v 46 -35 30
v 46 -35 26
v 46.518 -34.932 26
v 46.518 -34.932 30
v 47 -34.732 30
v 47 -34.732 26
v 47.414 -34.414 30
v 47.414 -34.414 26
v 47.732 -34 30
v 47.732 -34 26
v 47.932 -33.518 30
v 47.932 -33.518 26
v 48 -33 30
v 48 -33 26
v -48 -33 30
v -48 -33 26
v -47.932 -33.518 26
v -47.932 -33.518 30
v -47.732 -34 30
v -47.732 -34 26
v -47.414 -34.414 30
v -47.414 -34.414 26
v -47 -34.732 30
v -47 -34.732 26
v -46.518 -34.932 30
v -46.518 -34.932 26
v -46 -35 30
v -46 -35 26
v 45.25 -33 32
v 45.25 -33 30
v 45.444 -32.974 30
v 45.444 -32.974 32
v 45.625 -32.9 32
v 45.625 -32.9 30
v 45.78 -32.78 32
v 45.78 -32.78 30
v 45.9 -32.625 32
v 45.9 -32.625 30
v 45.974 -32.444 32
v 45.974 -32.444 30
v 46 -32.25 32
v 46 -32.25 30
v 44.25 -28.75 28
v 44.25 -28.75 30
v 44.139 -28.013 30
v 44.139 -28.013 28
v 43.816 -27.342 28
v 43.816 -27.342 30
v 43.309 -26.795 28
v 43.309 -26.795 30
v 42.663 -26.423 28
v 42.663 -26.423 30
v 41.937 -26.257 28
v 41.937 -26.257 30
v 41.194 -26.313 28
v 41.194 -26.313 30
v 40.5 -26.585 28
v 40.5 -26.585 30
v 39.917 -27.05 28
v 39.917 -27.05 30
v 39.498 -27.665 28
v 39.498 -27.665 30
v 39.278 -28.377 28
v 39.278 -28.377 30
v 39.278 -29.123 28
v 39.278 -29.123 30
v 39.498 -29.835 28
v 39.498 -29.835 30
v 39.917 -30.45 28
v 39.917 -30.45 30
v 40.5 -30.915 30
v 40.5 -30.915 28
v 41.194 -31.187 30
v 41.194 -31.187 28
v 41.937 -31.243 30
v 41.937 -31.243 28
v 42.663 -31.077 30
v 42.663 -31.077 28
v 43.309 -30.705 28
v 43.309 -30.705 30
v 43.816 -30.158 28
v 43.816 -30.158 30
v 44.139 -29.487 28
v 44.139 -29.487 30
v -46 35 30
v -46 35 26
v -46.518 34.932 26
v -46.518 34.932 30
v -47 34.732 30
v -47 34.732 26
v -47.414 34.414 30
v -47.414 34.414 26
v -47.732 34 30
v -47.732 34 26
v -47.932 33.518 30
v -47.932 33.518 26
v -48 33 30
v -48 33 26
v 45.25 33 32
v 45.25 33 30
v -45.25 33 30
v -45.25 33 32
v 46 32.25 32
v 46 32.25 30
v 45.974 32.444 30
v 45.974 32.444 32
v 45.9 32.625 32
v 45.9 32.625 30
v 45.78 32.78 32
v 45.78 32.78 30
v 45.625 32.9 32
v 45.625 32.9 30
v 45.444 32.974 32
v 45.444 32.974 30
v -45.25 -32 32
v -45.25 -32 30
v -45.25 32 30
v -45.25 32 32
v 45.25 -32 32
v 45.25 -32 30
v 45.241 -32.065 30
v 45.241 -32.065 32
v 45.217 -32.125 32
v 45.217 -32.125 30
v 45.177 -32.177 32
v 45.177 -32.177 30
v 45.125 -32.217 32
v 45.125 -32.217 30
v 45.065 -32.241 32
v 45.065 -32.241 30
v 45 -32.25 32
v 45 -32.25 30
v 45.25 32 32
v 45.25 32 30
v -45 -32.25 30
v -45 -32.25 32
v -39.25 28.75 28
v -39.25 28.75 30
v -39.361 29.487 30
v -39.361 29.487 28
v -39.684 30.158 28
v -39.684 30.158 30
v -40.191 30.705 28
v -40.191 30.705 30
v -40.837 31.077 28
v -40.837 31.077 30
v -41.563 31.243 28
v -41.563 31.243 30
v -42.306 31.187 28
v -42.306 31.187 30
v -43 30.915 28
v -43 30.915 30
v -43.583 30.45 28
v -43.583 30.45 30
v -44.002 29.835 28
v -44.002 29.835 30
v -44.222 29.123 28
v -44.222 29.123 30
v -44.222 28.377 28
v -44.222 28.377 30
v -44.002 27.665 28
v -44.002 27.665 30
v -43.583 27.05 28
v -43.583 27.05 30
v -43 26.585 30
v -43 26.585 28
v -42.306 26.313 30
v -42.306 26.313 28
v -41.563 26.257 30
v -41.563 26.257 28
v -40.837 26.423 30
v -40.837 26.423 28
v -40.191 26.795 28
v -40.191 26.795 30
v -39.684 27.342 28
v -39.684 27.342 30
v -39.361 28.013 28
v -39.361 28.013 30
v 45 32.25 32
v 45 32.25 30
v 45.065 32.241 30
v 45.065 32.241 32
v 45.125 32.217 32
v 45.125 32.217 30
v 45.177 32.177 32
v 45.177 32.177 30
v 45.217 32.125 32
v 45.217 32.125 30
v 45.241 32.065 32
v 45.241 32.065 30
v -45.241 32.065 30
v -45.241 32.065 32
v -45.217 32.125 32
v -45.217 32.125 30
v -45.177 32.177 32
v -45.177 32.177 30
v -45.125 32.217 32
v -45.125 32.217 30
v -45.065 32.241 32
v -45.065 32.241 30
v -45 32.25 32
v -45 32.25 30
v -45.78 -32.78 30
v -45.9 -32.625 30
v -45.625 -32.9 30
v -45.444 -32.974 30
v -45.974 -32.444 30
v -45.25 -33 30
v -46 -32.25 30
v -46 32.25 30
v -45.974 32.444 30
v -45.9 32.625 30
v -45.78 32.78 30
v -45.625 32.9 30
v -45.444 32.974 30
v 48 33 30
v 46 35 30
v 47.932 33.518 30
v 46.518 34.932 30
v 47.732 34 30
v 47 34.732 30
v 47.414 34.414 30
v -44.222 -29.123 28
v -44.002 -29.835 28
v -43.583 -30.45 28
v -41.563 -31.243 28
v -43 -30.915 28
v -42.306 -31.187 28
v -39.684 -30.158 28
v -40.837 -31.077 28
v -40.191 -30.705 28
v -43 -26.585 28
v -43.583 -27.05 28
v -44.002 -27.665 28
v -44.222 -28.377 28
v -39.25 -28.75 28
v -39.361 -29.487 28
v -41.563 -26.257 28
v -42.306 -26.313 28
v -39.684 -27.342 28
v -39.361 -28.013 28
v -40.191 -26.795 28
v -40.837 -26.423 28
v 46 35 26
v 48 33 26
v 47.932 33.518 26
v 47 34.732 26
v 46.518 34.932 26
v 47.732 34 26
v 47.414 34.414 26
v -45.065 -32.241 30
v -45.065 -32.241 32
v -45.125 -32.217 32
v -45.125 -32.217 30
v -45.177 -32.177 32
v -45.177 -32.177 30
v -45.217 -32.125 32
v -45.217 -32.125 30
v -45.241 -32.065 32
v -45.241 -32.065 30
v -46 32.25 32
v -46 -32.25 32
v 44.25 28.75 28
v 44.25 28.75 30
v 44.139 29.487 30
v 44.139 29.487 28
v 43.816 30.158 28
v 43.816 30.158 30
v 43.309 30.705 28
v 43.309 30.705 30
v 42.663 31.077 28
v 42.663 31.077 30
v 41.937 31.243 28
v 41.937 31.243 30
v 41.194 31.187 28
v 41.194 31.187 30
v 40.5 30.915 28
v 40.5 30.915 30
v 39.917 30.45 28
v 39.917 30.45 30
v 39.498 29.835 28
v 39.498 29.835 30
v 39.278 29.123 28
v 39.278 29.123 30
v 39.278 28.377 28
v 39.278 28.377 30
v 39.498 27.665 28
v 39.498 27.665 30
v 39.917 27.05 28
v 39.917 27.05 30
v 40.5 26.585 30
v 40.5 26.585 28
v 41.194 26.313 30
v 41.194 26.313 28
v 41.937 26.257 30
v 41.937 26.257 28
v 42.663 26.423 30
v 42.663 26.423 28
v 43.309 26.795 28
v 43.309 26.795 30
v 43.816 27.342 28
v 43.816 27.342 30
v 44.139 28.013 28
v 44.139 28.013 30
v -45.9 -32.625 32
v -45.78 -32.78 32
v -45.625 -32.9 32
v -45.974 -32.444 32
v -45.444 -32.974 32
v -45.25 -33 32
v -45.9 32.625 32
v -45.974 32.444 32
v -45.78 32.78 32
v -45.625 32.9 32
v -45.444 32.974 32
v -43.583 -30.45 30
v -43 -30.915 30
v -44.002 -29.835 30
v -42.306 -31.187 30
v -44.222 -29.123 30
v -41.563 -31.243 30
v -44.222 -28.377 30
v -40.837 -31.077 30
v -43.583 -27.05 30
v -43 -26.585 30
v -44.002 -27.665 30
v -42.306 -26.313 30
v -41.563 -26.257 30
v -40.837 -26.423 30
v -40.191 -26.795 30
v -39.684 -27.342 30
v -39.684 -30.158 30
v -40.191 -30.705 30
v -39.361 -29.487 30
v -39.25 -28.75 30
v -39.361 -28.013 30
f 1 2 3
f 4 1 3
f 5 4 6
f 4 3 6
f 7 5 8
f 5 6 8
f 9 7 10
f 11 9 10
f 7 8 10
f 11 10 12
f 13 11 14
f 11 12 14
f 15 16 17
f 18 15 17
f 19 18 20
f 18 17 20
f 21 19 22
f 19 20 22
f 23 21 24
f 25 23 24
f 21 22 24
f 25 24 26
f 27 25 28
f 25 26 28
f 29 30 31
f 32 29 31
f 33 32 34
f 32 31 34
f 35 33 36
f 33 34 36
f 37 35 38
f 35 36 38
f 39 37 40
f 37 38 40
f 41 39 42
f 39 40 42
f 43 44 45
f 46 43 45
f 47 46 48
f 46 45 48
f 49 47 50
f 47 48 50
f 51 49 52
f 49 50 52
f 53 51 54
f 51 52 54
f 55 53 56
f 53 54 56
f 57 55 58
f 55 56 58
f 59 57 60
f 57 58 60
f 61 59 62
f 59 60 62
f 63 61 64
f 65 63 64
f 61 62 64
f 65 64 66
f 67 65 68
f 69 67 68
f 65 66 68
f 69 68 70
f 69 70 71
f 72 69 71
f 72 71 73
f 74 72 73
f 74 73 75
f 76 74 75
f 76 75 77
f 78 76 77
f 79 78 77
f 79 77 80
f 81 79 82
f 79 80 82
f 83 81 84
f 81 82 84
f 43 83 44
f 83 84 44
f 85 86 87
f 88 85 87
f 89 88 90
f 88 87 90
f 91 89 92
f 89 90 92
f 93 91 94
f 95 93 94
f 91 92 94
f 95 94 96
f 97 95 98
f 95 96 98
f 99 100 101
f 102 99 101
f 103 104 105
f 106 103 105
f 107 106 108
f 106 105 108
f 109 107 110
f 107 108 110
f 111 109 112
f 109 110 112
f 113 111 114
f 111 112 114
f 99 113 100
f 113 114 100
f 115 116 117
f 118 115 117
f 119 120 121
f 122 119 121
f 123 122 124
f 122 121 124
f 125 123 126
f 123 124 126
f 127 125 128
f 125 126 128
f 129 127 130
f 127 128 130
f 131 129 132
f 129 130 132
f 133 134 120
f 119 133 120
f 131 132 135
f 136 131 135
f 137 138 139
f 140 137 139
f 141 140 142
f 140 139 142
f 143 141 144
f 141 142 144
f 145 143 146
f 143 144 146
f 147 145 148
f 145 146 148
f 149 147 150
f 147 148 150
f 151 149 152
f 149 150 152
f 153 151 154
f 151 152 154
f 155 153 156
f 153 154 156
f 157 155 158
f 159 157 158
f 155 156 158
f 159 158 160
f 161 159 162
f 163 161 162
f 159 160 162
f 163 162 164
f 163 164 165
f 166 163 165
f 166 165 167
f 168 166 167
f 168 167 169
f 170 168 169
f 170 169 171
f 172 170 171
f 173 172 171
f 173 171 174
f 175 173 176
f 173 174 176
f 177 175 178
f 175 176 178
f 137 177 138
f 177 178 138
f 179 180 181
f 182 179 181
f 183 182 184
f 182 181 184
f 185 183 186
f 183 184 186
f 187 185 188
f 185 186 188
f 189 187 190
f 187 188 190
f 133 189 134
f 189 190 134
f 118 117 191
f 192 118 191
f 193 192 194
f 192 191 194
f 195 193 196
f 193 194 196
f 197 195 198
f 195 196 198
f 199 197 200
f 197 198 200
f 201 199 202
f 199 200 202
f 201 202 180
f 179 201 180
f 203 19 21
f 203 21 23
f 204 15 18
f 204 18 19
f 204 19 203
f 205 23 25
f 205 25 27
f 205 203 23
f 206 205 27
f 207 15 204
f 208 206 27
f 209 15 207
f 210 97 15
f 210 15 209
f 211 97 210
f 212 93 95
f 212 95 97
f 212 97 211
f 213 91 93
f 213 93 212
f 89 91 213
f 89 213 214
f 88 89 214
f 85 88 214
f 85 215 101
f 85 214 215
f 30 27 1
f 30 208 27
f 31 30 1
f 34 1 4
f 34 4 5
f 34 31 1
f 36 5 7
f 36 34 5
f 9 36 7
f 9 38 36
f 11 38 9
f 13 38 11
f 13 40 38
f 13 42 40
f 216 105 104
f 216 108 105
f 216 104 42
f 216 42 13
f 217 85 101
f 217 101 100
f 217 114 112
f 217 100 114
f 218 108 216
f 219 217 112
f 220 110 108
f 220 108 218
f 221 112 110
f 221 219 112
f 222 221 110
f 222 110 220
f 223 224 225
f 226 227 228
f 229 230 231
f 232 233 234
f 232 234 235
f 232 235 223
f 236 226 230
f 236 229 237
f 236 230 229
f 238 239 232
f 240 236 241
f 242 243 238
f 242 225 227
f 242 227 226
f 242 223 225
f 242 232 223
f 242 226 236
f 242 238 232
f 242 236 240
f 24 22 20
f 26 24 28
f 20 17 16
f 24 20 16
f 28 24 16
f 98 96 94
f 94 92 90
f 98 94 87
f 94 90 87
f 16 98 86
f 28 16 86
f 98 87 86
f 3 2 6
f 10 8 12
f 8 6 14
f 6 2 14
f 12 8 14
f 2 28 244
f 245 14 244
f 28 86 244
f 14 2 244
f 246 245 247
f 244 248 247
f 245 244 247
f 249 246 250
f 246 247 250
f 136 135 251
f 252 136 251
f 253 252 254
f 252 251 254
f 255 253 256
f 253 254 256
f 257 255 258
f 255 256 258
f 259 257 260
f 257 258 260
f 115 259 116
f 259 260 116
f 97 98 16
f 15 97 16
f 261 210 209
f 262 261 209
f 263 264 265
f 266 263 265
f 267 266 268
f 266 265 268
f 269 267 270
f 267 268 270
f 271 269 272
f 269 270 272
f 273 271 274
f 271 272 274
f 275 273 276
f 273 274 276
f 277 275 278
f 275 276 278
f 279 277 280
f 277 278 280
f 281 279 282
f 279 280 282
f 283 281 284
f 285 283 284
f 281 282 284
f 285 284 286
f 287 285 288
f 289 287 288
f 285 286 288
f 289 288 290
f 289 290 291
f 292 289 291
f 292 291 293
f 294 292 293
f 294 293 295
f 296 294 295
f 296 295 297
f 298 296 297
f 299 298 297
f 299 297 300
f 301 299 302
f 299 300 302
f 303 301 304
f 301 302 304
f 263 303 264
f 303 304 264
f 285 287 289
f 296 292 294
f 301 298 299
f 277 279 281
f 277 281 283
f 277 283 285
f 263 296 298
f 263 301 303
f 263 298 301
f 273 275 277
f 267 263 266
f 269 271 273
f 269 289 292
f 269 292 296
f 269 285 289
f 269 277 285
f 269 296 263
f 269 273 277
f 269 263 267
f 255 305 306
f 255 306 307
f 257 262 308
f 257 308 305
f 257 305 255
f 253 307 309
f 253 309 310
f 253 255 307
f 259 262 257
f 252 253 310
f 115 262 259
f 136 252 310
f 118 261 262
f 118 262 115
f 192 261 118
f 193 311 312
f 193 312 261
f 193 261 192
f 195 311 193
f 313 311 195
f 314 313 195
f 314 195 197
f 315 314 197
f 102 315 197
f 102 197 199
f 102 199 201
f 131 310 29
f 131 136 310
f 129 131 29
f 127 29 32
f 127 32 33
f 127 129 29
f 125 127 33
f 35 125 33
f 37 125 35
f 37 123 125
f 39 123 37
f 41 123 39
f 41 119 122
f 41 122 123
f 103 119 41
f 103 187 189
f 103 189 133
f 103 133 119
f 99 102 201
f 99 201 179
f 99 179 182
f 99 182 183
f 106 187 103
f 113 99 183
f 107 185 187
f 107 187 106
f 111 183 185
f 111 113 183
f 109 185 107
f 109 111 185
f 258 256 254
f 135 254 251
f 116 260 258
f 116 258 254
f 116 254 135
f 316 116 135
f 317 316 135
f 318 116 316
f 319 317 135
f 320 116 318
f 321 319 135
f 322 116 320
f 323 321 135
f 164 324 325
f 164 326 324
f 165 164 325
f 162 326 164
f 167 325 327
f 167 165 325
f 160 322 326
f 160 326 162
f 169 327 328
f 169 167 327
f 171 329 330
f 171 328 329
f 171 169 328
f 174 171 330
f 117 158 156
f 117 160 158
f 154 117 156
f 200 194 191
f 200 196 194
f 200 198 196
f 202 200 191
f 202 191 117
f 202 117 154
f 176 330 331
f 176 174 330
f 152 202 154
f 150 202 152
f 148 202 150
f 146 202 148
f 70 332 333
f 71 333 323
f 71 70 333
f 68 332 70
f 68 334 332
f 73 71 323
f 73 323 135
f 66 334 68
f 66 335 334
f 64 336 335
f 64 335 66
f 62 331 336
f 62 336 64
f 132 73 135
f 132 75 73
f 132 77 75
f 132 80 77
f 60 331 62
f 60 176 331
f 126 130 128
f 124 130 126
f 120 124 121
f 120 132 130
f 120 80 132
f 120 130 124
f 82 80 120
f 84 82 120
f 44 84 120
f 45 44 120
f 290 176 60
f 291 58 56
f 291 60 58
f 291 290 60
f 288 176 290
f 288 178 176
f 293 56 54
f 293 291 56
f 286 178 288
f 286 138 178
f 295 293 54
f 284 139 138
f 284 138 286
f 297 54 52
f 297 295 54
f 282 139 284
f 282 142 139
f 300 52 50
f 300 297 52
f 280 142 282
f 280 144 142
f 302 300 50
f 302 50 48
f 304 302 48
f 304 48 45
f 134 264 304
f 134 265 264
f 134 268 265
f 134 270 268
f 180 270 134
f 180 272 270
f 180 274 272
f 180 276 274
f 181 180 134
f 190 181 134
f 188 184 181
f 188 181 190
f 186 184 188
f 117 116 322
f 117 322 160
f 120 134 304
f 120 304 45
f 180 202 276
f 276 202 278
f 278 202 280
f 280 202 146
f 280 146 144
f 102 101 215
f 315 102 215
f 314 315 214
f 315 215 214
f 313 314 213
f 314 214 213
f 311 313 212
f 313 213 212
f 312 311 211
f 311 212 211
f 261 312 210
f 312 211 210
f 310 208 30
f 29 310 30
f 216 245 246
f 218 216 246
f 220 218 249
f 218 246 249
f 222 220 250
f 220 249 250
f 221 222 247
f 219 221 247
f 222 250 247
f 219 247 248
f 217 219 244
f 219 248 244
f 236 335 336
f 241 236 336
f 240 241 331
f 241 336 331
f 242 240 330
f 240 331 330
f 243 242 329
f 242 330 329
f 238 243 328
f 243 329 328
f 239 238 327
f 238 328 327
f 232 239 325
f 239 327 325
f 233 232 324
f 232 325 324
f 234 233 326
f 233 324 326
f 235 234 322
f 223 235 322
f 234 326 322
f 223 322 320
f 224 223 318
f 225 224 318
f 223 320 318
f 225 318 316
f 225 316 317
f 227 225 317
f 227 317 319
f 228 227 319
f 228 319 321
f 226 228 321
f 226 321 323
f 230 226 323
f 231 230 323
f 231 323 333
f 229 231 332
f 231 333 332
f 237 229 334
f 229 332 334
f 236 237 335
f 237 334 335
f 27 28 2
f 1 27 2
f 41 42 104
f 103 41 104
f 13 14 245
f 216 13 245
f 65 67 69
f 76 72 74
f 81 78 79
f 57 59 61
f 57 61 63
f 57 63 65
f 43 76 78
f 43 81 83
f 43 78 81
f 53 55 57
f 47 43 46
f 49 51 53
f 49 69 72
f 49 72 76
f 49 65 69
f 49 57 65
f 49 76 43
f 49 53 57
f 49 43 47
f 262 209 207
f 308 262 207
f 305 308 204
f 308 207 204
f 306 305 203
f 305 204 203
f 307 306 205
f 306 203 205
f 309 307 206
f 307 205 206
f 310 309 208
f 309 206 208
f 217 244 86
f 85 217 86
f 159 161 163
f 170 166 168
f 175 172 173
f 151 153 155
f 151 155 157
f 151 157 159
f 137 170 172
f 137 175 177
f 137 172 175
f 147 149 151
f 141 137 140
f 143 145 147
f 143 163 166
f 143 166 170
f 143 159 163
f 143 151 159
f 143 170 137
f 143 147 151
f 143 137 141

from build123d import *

# Parameters (mm, degrees)
F1_DEPTH  = 26
F2_DEPTH  = 4
F3_W      = 90
F3_H      = 64
F4_DEPTH  = 2
F6_DEPTH  = 2
F7_R      = 2.5
F8_DEPTH  = 2
F9_R      = 2.5
F10_DEPTH = 2
F11_W     = 5
F11_H     = 50
F11_W_2   = 76
F11_H_2   = 5
F12_DEPTH = 22
F13_R     = 1
F14_DEPTH = 5
F15_R     = 11
F15_R_2   = 5
F16_DEPTH = 2
F17_DEPTH = 5
F19_W     = 20.16
F19_H     = 11.52
F19_R     = 3
F19_R_2   = 2
F20_DEPTH = 5
F19_W_2   = 66
F19_H_2   = 18
F19_R_3   = 1.8
F21_DEPTH = 3
F22_DEPTH = 3
F19_R_4   = 0.8
F23_DEPTH = 1.9
F24_DEPTH = 1.9
F25_DEPTH = 1.9


# Not quite as in the source:
# - a feature names something its author has since deleted; it is built from what else it names


with BuildPart() as f1:
    # F0 (on Top) → F1 (new body)
    with BuildSketch(Plane.XY):
        with BuildLine():
            Line((46, 35), (-46, 35))
            ThreePointArc((-46, 35), (-47.4142135624, 34.4142135624), (-48, 33))
            Line((-48, 33), (-48, -33))
            ThreePointArc((-48, -33), (-47.4142135624, -34.4142135624), (-46, -35))
            Line((-46, -35), (46, -35))
            ThreePointArc((46, -35), (47.4142135624, -34.4142135624), (48, -33))
            Line((48, -33), (48, 33))
            ThreePointArc((48, 33), (47.4142135624, 34.4142135624), (46, 35))
        make_face()
    extrude(amount=F1_DEPTH)


with BuildPart() as f2:
    # F2 (new): a face of the model
    f2_faces = [f1.part.faces().sort_by_distance(p)[0] for p in [
        (0, 0, 26),
    ]]
    extrude(f2_faces, amount=F2_DEPTH)

    # F5 (on face) → F6 (join)
    with BuildSketch(Plane.XY.offset(30)):
        with BuildLine():
            Line((45.25, 33), (-45.25, 33))
            ThreePointArc((-45.25, 33), (-45.7803300859, 32.7803300859), (-46, 32.25))
            Line((-46, 32.25), (-46, -32.25))
            ThreePointArc((-46, -32.25), (-45.7803300859, -32.7803300859), (-45.25, -33))
            Line((-45.25, -33), (45.25, -33))
            ThreePointArc((45.25, -33), (45.7803300859, -32.7803300859), (46, -32.25))
            Line((46, -32.25), (46, 32.25))
            ThreePointArc((46, 32.25), (45.7803300859, 32.7803300859), (45.25, 33))
        make_face()
        with BuildLine():
            ThreePointArc((-45.25, 32), (-45.1767766953, 32.1767766953), (-45, 32.25))
            Line((-45, 32.25), (45, 32.25))
            ThreePointArc((45, 32.25), (45.1767766953, 32.1767766953), (45.25, 32))
            Line((45.25, 32), (45.25, -32))
            ThreePointArc((45.25, -32), (45.1767766953, -32.1767766953), (45, -32.25))
            Line((45, -32.25), (-45, -32.25))
            ThreePointArc((-45, -32.25), (-45.1767766953, -32.1767766953), (-45.25, -32))
            Line((-45.25, -32), (-45.25, 32))
        make_face(mode=Mode.SUBTRACT)
    extrude(amount=F6_DEPTH)

    # F9 (on face) → F10 (cut)
    with BuildSketch(Plane.XY.offset(30)):
        with Locations((-41.75, -28.75)):
            Circle(F9_R)
        with Locations((-41.75, 28.75)):
            Circle(F9_R)
        with Locations((41.75, 28.75)):
            Circle(F9_R)
        with Locations((41.75, -28.75)):
            Circle(F9_R)
    extrude(amount=-F10_DEPTH, mode=Mode.SUBTRACT)


with BuildPart() as f1_1:
    add(f1.part)

    # F3 (on face) → F4 (cut)
    with BuildSketch(Plane.XY.offset(26)):
        with BuildLine():
            Line((45, 33), (-45, 33))
            ThreePointArc((-45, 33), (-45.7071067812, 32.7071067812), (-46, 32))
            Line((-46, 32), (-46, -32))
            ThreePointArc((-46, -32), (-45.7071067812, -32.7071067812), (-45, -33))
            Line((-45, -33), (45, -33))
            ThreePointArc((45, -33), (45.7071067812, -32.7071067812), (46, -32))
            Line((46, -32), (46, 32))
            ThreePointArc((46, 32), (45.7071067812, 32.7071067812), (45, 33))
        make_face()
        Rectangle(F3_W, F3_H, mode=Mode.SUBTRACT)
    extrude(amount=-F4_DEPTH, mode=Mode.SUBTRACT)

    # F7 (on face) → F8 (cut)
    with BuildSketch(Plane.XY.offset(26)):
        with Locations((-41.5, -28.5)):
            Circle(F7_R)
        with Locations((-41.4999984205, 28.5)):
            Circle(F7_R)
        with Locations((41.5, 28.5)):
            Circle(F7_R)
        with Locations((41.5, -28.5)):
            Circle(F7_R)
    extrude(amount=-F8_DEPTH, mode=Mode.SUBTRACT)

    # F11 (on face) → F12 (cut)
    with BuildSketch(Plane.XY.offset(26)):
        with Locations((-40.5, 0)):
            Rectangle(F11_W, F11_H)
        with Locations((0, -27.5)):
            Rectangle(F11_W_2, F11_H_2)
        Rectangle(F11_W_2, F11_H)
        with Locations((0, 27.5)):
            Rectangle(F11_W_2, F11_H_2)
        with Locations((40.5, 0)):
            Rectangle(F11_W, F11_H)
    extrude(amount=-F12_DEPTH, mode=Mode.SUBTRACT)

    # F13 (on face) → F14 (cut, through all)
    with BuildSketch(Plane.YZ.offset(48)):
        with Locations((7.9999985173, 14.5000000224)):
            Circle(F13_R)
        with Locations((7.9999985173, 11.5000000224)):
            Circle(F13_R)
        with Locations((10.9999985173, 11.5000000224)):
            Circle(F13_R)
        with Locations((10.9999985173, 14.5000000224)):
            Circle(F13_R)
        with Locations((13.9999985173, 14.5000000224)):
            Circle(F13_R)
        with Locations((13.9999985173, 11.5000000224)):
            Circle(F13_R)
    extrude(amount=-F14_DEPTH, mode=Mode.SUBTRACT)

    # F15 (on face) → F16 (cut)
    with BuildSketch(Plane(origin=(-48, 0, 0), x_dir=(0, -1, 0), z_dir=(-1, 0, 0))):
        with Locations((6.9999988191, 12.5000002682)):
            Circle(F15_R)
        with Locations((6.9999988191, 12.5000002682)):
            Circle(F15_R_2, mode=Mode.SUBTRACT)
    extrude(amount=-F16_DEPTH, mode=Mode.SUBTRACT)

    # F15 (on face) → F17 (cut, through all)
    with BuildSketch(Plane(origin=(-48, 0, 0), x_dir=(0, -1, 0), z_dir=(-1, 0, 0))):
        with Locations((6.9999988191, 12.5000002682)):
            Circle(F15_R_2)
    extrude(amount=-F17_DEPTH, mode=Mode.SUBTRACT)

    # F19 (on face) → F20 (cut, through all)
    with BuildSketch(Plane(origin=(0, -30, 0), x_dir=(-1, 0, 0), z_dir=(0, 1, 0))):
        with Locations((4.7299169147, 14.0678631142)):
            Rectangle(F19_W, F19_H)
        with Locations((28.8399169147, 14.0678631142)):
            Circle(F19_R)
        with Locations((-11.1500830853, 14.0678631142)):
            Circle(F19_R_2)
        with Locations((-17.7100830853, 14.0678631142)):
            Circle(F19_R_2)
        with Locations((-24.2600830853, 14.0678631142)):
            Circle(F19_R_2)
        with BuildLine():
            ThreePointArc((-30.8900830853, 11.0678631142), (-30.5971898665, 10.360756333), (-29.8900830853, 10.0678631142))
            Line((-29.8900830853, 10.0678631142), (-28.9900830853, 10.0678631142))
            ThreePointArc((-28.9900830853, 10.0678631142), (-28.2829763041, 10.360756333), (-27.9900830853, 11.0678631142))
            Line((-27.9900830853, 11.0678631142), (-27.9900830853, 17.0678631142))
            ThreePointArc((-27.9900830853, 17.0678631142), (-28.2829763041, 17.7749698954), (-28.9900830853, 18.0678631142))
            Line((-28.9900830853, 18.0678631142), (-29.8900830853, 18.0678631142))
            ThreePointArc((-29.8900830853, 18.0678631142), (-30.5971898665, 17.7749698954), (-30.8900830853, 17.0678631142))
            Line((-30.8900830853, 17.0678631142), (-30.8900830853, 11.0678631142))
        make_face()
    extrude(amount=-F20_DEPTH, mode=Mode.SUBTRACT)

    # F19 (on face) → F21 (cut)
    with BuildSketch(Plane(origin=(0, -30, 0), x_dir=(-1, 0, 0), z_dir=(0, 1, 0))):
        with Locations((-0.1600830853, 14.0678631142)):
            Rectangle(F19_W_2, F19_H_2)
        with Locations((-24.0000830853, 7.5678631142)):
            Circle(F19_R_3, mode=Mode.SUBTRACT)
        with BuildLine():
            Line((-28.9900830853, 10.0678631142), (-29.8900830853, 10.0678631142))
            ThreePointArc((-29.8900830853, 10.0678631142), (-30.5971898665, 10.360756333), (-30.8900830853, 11.0678631142))
            Line((-30.8900830853, 11.0678631142), (-30.8900830853, 17.0678631142))
            ThreePointArc((-30.8900830853, 17.0678631142), (-30.5971898665, 17.7749698954), (-29.8900830853, 18.0678631142))
            Line((-29.8900830853, 18.0678631142), (-28.9900830853, 18.0678631142))
            ThreePointArc((-28.9900830853, 18.0678631142), (-28.2829763041, 17.7749698954), (-27.9900830853, 17.0678631142))
            Line((-27.9900830853, 17.0678631142), (-27.9900830853, 11.0678631142))
            ThreePointArc((-27.9900830853, 11.0678631142), (-28.2829763041, 10.360756333), (-28.9900830853, 10.0678631142))
        make_face(mode=Mode.SUBTRACT)
        with Locations((-24.2600830853, 14.0678631142)):
            Circle(F19_R_2, mode=Mode.SUBTRACT)
        with Locations((-17.7100830853, 14.0678631142)):
            Circle(F19_R_2, mode=Mode.SUBTRACT)
        with Locations((-11.1500830853, 14.0678631142)):
            Circle(F19_R_2, mode=Mode.SUBTRACT)
        with Locations((30.1799169147, 7.5678631142)):
            Circle(F19_R_3, mode=Mode.SUBTRACT)
        with Locations((4.7299169147, 14.0678631142)):
            Rectangle(F19_W, F19_H, mode=Mode.SUBTRACT)
        with Locations((28.8399169147, 14.0678631142)):
            Circle(F19_R, mode=Mode.SUBTRACT)
        with Locations((30.1799169147, 20.5678631142)):
            Circle(F19_R_3, mode=Mode.SUBTRACT)
    extrude(amount=F21_DEPTH, mode=Mode.SUBTRACT)

    # F19 (on face) → F22 (cut)
    with BuildSketch(Plane(origin=(0, -30, 0), x_dir=(-1, 0, 0), z_dir=(0, 1, 0))):
        with Locations((-0.1600830853, 14.0678631142)):
            Rectangle(F19_W_2, F19_H_2)
        with Locations((-24.0000830853, 7.5678631142)):
            Circle(F19_R_3, mode=Mode.SUBTRACT)
        with BuildLine():
            Line((-28.9900830853, 10.0678631142), (-29.8900830853, 10.0678631142))
            ThreePointArc((-29.8900830853, 10.0678631142), (-30.5971898665, 10.360756333), (-30.8900830853, 11.0678631142))
            Line((-30.8900830853, 11.0678631142), (-30.8900830853, 17.0678631142))
            ThreePointArc((-30.8900830853, 17.0678631142), (-30.5971898665, 17.7749698954), (-29.8900830853, 18.0678631142))
            Line((-29.8900830853, 18.0678631142), (-28.9900830853, 18.0678631142))
            ThreePointArc((-28.9900830853, 18.0678631142), (-28.2829763041, 17.7749698954), (-27.9900830853, 17.0678631142))
            Line((-27.9900830853, 17.0678631142), (-27.9900830853, 11.0678631142))
            ThreePointArc((-27.9900830853, 11.0678631142), (-28.2829763041, 10.360756333), (-28.9900830853, 10.0678631142))
        make_face(mode=Mode.SUBTRACT)
        with Locations((-24.2600830853, 14.0678631142)):
            Circle(F19_R_2, mode=Mode.SUBTRACT)
        with Locations((-17.7100830853, 14.0678631142)):
            Circle(F19_R_2, mode=Mode.SUBTRACT)
        with Locations((-11.1500830853, 14.0678631142)):
            Circle(F19_R_2, mode=Mode.SUBTRACT)
        with Locations((30.1799169147, 7.5678631142)):
            Circle(F19_R_3, mode=Mode.SUBTRACT)
        with Locations((4.7299169147, 14.0678631142)):
            Rectangle(F19_W, F19_H, mode=Mode.SUBTRACT)
        with Locations((28.8399169147, 14.0678631142)):
            Circle(F19_R, mode=Mode.SUBTRACT)
        with Locations((30.1799169147, 20.5678631142)):
            Circle(F19_R_3, mode=Mode.SUBTRACT)
    extrude(amount=-F22_DEPTH, mode=Mode.SUBTRACT)

    # F19 (on face) → F23 (join)
    with BuildSketch(Plane(origin=(0, -30, 0), x_dir=(-1, 0, 0), z_dir=(0, 1, 0))):
        with Locations((30.1799169147, 20.5678631142)):
            Circle(F19_R_3)
        with Locations((30.1799169147, 20.5678631142)):
            Circle(F19_R_4, mode=Mode.SUBTRACT)
    extrude(amount=F23_DEPTH)

    # F19 (on face) → F24 (join)
    with BuildSketch(Plane(origin=(0, -30, 0), x_dir=(-1, 0, 0), z_dir=(0, 1, 0))):
        with Locations((30.1799169147, 7.5678631142)):
            Circle(F19_R_3)
        with Locations((30.1799169147, 7.5678631142)):
            Circle(F19_R_4, mode=Mode.SUBTRACT)
    extrude(amount=F24_DEPTH)

    # F19 (on face) → F25 (join)
    with BuildSketch(Plane(origin=(0, -30, 0), x_dir=(-1, 0, 0), z_dir=(0, 1, 0))):
        with Locations((-24.0000830853, 7.5678631142)):
            Circle(F19_R_3)
        with Locations((-24.0000830853, 7.5678631142)):
            Circle(F19_R_4, mode=Mode.SUBTRACT)
    extrude(amount=F25_DEPTH)


with BuildPart() as f27_1:
    # F27: copy of F2
    add(f2.part)


with BuildPart() as f29_1:
    # F29: copy of F2
    add(f2.part)


solid = f2.part
